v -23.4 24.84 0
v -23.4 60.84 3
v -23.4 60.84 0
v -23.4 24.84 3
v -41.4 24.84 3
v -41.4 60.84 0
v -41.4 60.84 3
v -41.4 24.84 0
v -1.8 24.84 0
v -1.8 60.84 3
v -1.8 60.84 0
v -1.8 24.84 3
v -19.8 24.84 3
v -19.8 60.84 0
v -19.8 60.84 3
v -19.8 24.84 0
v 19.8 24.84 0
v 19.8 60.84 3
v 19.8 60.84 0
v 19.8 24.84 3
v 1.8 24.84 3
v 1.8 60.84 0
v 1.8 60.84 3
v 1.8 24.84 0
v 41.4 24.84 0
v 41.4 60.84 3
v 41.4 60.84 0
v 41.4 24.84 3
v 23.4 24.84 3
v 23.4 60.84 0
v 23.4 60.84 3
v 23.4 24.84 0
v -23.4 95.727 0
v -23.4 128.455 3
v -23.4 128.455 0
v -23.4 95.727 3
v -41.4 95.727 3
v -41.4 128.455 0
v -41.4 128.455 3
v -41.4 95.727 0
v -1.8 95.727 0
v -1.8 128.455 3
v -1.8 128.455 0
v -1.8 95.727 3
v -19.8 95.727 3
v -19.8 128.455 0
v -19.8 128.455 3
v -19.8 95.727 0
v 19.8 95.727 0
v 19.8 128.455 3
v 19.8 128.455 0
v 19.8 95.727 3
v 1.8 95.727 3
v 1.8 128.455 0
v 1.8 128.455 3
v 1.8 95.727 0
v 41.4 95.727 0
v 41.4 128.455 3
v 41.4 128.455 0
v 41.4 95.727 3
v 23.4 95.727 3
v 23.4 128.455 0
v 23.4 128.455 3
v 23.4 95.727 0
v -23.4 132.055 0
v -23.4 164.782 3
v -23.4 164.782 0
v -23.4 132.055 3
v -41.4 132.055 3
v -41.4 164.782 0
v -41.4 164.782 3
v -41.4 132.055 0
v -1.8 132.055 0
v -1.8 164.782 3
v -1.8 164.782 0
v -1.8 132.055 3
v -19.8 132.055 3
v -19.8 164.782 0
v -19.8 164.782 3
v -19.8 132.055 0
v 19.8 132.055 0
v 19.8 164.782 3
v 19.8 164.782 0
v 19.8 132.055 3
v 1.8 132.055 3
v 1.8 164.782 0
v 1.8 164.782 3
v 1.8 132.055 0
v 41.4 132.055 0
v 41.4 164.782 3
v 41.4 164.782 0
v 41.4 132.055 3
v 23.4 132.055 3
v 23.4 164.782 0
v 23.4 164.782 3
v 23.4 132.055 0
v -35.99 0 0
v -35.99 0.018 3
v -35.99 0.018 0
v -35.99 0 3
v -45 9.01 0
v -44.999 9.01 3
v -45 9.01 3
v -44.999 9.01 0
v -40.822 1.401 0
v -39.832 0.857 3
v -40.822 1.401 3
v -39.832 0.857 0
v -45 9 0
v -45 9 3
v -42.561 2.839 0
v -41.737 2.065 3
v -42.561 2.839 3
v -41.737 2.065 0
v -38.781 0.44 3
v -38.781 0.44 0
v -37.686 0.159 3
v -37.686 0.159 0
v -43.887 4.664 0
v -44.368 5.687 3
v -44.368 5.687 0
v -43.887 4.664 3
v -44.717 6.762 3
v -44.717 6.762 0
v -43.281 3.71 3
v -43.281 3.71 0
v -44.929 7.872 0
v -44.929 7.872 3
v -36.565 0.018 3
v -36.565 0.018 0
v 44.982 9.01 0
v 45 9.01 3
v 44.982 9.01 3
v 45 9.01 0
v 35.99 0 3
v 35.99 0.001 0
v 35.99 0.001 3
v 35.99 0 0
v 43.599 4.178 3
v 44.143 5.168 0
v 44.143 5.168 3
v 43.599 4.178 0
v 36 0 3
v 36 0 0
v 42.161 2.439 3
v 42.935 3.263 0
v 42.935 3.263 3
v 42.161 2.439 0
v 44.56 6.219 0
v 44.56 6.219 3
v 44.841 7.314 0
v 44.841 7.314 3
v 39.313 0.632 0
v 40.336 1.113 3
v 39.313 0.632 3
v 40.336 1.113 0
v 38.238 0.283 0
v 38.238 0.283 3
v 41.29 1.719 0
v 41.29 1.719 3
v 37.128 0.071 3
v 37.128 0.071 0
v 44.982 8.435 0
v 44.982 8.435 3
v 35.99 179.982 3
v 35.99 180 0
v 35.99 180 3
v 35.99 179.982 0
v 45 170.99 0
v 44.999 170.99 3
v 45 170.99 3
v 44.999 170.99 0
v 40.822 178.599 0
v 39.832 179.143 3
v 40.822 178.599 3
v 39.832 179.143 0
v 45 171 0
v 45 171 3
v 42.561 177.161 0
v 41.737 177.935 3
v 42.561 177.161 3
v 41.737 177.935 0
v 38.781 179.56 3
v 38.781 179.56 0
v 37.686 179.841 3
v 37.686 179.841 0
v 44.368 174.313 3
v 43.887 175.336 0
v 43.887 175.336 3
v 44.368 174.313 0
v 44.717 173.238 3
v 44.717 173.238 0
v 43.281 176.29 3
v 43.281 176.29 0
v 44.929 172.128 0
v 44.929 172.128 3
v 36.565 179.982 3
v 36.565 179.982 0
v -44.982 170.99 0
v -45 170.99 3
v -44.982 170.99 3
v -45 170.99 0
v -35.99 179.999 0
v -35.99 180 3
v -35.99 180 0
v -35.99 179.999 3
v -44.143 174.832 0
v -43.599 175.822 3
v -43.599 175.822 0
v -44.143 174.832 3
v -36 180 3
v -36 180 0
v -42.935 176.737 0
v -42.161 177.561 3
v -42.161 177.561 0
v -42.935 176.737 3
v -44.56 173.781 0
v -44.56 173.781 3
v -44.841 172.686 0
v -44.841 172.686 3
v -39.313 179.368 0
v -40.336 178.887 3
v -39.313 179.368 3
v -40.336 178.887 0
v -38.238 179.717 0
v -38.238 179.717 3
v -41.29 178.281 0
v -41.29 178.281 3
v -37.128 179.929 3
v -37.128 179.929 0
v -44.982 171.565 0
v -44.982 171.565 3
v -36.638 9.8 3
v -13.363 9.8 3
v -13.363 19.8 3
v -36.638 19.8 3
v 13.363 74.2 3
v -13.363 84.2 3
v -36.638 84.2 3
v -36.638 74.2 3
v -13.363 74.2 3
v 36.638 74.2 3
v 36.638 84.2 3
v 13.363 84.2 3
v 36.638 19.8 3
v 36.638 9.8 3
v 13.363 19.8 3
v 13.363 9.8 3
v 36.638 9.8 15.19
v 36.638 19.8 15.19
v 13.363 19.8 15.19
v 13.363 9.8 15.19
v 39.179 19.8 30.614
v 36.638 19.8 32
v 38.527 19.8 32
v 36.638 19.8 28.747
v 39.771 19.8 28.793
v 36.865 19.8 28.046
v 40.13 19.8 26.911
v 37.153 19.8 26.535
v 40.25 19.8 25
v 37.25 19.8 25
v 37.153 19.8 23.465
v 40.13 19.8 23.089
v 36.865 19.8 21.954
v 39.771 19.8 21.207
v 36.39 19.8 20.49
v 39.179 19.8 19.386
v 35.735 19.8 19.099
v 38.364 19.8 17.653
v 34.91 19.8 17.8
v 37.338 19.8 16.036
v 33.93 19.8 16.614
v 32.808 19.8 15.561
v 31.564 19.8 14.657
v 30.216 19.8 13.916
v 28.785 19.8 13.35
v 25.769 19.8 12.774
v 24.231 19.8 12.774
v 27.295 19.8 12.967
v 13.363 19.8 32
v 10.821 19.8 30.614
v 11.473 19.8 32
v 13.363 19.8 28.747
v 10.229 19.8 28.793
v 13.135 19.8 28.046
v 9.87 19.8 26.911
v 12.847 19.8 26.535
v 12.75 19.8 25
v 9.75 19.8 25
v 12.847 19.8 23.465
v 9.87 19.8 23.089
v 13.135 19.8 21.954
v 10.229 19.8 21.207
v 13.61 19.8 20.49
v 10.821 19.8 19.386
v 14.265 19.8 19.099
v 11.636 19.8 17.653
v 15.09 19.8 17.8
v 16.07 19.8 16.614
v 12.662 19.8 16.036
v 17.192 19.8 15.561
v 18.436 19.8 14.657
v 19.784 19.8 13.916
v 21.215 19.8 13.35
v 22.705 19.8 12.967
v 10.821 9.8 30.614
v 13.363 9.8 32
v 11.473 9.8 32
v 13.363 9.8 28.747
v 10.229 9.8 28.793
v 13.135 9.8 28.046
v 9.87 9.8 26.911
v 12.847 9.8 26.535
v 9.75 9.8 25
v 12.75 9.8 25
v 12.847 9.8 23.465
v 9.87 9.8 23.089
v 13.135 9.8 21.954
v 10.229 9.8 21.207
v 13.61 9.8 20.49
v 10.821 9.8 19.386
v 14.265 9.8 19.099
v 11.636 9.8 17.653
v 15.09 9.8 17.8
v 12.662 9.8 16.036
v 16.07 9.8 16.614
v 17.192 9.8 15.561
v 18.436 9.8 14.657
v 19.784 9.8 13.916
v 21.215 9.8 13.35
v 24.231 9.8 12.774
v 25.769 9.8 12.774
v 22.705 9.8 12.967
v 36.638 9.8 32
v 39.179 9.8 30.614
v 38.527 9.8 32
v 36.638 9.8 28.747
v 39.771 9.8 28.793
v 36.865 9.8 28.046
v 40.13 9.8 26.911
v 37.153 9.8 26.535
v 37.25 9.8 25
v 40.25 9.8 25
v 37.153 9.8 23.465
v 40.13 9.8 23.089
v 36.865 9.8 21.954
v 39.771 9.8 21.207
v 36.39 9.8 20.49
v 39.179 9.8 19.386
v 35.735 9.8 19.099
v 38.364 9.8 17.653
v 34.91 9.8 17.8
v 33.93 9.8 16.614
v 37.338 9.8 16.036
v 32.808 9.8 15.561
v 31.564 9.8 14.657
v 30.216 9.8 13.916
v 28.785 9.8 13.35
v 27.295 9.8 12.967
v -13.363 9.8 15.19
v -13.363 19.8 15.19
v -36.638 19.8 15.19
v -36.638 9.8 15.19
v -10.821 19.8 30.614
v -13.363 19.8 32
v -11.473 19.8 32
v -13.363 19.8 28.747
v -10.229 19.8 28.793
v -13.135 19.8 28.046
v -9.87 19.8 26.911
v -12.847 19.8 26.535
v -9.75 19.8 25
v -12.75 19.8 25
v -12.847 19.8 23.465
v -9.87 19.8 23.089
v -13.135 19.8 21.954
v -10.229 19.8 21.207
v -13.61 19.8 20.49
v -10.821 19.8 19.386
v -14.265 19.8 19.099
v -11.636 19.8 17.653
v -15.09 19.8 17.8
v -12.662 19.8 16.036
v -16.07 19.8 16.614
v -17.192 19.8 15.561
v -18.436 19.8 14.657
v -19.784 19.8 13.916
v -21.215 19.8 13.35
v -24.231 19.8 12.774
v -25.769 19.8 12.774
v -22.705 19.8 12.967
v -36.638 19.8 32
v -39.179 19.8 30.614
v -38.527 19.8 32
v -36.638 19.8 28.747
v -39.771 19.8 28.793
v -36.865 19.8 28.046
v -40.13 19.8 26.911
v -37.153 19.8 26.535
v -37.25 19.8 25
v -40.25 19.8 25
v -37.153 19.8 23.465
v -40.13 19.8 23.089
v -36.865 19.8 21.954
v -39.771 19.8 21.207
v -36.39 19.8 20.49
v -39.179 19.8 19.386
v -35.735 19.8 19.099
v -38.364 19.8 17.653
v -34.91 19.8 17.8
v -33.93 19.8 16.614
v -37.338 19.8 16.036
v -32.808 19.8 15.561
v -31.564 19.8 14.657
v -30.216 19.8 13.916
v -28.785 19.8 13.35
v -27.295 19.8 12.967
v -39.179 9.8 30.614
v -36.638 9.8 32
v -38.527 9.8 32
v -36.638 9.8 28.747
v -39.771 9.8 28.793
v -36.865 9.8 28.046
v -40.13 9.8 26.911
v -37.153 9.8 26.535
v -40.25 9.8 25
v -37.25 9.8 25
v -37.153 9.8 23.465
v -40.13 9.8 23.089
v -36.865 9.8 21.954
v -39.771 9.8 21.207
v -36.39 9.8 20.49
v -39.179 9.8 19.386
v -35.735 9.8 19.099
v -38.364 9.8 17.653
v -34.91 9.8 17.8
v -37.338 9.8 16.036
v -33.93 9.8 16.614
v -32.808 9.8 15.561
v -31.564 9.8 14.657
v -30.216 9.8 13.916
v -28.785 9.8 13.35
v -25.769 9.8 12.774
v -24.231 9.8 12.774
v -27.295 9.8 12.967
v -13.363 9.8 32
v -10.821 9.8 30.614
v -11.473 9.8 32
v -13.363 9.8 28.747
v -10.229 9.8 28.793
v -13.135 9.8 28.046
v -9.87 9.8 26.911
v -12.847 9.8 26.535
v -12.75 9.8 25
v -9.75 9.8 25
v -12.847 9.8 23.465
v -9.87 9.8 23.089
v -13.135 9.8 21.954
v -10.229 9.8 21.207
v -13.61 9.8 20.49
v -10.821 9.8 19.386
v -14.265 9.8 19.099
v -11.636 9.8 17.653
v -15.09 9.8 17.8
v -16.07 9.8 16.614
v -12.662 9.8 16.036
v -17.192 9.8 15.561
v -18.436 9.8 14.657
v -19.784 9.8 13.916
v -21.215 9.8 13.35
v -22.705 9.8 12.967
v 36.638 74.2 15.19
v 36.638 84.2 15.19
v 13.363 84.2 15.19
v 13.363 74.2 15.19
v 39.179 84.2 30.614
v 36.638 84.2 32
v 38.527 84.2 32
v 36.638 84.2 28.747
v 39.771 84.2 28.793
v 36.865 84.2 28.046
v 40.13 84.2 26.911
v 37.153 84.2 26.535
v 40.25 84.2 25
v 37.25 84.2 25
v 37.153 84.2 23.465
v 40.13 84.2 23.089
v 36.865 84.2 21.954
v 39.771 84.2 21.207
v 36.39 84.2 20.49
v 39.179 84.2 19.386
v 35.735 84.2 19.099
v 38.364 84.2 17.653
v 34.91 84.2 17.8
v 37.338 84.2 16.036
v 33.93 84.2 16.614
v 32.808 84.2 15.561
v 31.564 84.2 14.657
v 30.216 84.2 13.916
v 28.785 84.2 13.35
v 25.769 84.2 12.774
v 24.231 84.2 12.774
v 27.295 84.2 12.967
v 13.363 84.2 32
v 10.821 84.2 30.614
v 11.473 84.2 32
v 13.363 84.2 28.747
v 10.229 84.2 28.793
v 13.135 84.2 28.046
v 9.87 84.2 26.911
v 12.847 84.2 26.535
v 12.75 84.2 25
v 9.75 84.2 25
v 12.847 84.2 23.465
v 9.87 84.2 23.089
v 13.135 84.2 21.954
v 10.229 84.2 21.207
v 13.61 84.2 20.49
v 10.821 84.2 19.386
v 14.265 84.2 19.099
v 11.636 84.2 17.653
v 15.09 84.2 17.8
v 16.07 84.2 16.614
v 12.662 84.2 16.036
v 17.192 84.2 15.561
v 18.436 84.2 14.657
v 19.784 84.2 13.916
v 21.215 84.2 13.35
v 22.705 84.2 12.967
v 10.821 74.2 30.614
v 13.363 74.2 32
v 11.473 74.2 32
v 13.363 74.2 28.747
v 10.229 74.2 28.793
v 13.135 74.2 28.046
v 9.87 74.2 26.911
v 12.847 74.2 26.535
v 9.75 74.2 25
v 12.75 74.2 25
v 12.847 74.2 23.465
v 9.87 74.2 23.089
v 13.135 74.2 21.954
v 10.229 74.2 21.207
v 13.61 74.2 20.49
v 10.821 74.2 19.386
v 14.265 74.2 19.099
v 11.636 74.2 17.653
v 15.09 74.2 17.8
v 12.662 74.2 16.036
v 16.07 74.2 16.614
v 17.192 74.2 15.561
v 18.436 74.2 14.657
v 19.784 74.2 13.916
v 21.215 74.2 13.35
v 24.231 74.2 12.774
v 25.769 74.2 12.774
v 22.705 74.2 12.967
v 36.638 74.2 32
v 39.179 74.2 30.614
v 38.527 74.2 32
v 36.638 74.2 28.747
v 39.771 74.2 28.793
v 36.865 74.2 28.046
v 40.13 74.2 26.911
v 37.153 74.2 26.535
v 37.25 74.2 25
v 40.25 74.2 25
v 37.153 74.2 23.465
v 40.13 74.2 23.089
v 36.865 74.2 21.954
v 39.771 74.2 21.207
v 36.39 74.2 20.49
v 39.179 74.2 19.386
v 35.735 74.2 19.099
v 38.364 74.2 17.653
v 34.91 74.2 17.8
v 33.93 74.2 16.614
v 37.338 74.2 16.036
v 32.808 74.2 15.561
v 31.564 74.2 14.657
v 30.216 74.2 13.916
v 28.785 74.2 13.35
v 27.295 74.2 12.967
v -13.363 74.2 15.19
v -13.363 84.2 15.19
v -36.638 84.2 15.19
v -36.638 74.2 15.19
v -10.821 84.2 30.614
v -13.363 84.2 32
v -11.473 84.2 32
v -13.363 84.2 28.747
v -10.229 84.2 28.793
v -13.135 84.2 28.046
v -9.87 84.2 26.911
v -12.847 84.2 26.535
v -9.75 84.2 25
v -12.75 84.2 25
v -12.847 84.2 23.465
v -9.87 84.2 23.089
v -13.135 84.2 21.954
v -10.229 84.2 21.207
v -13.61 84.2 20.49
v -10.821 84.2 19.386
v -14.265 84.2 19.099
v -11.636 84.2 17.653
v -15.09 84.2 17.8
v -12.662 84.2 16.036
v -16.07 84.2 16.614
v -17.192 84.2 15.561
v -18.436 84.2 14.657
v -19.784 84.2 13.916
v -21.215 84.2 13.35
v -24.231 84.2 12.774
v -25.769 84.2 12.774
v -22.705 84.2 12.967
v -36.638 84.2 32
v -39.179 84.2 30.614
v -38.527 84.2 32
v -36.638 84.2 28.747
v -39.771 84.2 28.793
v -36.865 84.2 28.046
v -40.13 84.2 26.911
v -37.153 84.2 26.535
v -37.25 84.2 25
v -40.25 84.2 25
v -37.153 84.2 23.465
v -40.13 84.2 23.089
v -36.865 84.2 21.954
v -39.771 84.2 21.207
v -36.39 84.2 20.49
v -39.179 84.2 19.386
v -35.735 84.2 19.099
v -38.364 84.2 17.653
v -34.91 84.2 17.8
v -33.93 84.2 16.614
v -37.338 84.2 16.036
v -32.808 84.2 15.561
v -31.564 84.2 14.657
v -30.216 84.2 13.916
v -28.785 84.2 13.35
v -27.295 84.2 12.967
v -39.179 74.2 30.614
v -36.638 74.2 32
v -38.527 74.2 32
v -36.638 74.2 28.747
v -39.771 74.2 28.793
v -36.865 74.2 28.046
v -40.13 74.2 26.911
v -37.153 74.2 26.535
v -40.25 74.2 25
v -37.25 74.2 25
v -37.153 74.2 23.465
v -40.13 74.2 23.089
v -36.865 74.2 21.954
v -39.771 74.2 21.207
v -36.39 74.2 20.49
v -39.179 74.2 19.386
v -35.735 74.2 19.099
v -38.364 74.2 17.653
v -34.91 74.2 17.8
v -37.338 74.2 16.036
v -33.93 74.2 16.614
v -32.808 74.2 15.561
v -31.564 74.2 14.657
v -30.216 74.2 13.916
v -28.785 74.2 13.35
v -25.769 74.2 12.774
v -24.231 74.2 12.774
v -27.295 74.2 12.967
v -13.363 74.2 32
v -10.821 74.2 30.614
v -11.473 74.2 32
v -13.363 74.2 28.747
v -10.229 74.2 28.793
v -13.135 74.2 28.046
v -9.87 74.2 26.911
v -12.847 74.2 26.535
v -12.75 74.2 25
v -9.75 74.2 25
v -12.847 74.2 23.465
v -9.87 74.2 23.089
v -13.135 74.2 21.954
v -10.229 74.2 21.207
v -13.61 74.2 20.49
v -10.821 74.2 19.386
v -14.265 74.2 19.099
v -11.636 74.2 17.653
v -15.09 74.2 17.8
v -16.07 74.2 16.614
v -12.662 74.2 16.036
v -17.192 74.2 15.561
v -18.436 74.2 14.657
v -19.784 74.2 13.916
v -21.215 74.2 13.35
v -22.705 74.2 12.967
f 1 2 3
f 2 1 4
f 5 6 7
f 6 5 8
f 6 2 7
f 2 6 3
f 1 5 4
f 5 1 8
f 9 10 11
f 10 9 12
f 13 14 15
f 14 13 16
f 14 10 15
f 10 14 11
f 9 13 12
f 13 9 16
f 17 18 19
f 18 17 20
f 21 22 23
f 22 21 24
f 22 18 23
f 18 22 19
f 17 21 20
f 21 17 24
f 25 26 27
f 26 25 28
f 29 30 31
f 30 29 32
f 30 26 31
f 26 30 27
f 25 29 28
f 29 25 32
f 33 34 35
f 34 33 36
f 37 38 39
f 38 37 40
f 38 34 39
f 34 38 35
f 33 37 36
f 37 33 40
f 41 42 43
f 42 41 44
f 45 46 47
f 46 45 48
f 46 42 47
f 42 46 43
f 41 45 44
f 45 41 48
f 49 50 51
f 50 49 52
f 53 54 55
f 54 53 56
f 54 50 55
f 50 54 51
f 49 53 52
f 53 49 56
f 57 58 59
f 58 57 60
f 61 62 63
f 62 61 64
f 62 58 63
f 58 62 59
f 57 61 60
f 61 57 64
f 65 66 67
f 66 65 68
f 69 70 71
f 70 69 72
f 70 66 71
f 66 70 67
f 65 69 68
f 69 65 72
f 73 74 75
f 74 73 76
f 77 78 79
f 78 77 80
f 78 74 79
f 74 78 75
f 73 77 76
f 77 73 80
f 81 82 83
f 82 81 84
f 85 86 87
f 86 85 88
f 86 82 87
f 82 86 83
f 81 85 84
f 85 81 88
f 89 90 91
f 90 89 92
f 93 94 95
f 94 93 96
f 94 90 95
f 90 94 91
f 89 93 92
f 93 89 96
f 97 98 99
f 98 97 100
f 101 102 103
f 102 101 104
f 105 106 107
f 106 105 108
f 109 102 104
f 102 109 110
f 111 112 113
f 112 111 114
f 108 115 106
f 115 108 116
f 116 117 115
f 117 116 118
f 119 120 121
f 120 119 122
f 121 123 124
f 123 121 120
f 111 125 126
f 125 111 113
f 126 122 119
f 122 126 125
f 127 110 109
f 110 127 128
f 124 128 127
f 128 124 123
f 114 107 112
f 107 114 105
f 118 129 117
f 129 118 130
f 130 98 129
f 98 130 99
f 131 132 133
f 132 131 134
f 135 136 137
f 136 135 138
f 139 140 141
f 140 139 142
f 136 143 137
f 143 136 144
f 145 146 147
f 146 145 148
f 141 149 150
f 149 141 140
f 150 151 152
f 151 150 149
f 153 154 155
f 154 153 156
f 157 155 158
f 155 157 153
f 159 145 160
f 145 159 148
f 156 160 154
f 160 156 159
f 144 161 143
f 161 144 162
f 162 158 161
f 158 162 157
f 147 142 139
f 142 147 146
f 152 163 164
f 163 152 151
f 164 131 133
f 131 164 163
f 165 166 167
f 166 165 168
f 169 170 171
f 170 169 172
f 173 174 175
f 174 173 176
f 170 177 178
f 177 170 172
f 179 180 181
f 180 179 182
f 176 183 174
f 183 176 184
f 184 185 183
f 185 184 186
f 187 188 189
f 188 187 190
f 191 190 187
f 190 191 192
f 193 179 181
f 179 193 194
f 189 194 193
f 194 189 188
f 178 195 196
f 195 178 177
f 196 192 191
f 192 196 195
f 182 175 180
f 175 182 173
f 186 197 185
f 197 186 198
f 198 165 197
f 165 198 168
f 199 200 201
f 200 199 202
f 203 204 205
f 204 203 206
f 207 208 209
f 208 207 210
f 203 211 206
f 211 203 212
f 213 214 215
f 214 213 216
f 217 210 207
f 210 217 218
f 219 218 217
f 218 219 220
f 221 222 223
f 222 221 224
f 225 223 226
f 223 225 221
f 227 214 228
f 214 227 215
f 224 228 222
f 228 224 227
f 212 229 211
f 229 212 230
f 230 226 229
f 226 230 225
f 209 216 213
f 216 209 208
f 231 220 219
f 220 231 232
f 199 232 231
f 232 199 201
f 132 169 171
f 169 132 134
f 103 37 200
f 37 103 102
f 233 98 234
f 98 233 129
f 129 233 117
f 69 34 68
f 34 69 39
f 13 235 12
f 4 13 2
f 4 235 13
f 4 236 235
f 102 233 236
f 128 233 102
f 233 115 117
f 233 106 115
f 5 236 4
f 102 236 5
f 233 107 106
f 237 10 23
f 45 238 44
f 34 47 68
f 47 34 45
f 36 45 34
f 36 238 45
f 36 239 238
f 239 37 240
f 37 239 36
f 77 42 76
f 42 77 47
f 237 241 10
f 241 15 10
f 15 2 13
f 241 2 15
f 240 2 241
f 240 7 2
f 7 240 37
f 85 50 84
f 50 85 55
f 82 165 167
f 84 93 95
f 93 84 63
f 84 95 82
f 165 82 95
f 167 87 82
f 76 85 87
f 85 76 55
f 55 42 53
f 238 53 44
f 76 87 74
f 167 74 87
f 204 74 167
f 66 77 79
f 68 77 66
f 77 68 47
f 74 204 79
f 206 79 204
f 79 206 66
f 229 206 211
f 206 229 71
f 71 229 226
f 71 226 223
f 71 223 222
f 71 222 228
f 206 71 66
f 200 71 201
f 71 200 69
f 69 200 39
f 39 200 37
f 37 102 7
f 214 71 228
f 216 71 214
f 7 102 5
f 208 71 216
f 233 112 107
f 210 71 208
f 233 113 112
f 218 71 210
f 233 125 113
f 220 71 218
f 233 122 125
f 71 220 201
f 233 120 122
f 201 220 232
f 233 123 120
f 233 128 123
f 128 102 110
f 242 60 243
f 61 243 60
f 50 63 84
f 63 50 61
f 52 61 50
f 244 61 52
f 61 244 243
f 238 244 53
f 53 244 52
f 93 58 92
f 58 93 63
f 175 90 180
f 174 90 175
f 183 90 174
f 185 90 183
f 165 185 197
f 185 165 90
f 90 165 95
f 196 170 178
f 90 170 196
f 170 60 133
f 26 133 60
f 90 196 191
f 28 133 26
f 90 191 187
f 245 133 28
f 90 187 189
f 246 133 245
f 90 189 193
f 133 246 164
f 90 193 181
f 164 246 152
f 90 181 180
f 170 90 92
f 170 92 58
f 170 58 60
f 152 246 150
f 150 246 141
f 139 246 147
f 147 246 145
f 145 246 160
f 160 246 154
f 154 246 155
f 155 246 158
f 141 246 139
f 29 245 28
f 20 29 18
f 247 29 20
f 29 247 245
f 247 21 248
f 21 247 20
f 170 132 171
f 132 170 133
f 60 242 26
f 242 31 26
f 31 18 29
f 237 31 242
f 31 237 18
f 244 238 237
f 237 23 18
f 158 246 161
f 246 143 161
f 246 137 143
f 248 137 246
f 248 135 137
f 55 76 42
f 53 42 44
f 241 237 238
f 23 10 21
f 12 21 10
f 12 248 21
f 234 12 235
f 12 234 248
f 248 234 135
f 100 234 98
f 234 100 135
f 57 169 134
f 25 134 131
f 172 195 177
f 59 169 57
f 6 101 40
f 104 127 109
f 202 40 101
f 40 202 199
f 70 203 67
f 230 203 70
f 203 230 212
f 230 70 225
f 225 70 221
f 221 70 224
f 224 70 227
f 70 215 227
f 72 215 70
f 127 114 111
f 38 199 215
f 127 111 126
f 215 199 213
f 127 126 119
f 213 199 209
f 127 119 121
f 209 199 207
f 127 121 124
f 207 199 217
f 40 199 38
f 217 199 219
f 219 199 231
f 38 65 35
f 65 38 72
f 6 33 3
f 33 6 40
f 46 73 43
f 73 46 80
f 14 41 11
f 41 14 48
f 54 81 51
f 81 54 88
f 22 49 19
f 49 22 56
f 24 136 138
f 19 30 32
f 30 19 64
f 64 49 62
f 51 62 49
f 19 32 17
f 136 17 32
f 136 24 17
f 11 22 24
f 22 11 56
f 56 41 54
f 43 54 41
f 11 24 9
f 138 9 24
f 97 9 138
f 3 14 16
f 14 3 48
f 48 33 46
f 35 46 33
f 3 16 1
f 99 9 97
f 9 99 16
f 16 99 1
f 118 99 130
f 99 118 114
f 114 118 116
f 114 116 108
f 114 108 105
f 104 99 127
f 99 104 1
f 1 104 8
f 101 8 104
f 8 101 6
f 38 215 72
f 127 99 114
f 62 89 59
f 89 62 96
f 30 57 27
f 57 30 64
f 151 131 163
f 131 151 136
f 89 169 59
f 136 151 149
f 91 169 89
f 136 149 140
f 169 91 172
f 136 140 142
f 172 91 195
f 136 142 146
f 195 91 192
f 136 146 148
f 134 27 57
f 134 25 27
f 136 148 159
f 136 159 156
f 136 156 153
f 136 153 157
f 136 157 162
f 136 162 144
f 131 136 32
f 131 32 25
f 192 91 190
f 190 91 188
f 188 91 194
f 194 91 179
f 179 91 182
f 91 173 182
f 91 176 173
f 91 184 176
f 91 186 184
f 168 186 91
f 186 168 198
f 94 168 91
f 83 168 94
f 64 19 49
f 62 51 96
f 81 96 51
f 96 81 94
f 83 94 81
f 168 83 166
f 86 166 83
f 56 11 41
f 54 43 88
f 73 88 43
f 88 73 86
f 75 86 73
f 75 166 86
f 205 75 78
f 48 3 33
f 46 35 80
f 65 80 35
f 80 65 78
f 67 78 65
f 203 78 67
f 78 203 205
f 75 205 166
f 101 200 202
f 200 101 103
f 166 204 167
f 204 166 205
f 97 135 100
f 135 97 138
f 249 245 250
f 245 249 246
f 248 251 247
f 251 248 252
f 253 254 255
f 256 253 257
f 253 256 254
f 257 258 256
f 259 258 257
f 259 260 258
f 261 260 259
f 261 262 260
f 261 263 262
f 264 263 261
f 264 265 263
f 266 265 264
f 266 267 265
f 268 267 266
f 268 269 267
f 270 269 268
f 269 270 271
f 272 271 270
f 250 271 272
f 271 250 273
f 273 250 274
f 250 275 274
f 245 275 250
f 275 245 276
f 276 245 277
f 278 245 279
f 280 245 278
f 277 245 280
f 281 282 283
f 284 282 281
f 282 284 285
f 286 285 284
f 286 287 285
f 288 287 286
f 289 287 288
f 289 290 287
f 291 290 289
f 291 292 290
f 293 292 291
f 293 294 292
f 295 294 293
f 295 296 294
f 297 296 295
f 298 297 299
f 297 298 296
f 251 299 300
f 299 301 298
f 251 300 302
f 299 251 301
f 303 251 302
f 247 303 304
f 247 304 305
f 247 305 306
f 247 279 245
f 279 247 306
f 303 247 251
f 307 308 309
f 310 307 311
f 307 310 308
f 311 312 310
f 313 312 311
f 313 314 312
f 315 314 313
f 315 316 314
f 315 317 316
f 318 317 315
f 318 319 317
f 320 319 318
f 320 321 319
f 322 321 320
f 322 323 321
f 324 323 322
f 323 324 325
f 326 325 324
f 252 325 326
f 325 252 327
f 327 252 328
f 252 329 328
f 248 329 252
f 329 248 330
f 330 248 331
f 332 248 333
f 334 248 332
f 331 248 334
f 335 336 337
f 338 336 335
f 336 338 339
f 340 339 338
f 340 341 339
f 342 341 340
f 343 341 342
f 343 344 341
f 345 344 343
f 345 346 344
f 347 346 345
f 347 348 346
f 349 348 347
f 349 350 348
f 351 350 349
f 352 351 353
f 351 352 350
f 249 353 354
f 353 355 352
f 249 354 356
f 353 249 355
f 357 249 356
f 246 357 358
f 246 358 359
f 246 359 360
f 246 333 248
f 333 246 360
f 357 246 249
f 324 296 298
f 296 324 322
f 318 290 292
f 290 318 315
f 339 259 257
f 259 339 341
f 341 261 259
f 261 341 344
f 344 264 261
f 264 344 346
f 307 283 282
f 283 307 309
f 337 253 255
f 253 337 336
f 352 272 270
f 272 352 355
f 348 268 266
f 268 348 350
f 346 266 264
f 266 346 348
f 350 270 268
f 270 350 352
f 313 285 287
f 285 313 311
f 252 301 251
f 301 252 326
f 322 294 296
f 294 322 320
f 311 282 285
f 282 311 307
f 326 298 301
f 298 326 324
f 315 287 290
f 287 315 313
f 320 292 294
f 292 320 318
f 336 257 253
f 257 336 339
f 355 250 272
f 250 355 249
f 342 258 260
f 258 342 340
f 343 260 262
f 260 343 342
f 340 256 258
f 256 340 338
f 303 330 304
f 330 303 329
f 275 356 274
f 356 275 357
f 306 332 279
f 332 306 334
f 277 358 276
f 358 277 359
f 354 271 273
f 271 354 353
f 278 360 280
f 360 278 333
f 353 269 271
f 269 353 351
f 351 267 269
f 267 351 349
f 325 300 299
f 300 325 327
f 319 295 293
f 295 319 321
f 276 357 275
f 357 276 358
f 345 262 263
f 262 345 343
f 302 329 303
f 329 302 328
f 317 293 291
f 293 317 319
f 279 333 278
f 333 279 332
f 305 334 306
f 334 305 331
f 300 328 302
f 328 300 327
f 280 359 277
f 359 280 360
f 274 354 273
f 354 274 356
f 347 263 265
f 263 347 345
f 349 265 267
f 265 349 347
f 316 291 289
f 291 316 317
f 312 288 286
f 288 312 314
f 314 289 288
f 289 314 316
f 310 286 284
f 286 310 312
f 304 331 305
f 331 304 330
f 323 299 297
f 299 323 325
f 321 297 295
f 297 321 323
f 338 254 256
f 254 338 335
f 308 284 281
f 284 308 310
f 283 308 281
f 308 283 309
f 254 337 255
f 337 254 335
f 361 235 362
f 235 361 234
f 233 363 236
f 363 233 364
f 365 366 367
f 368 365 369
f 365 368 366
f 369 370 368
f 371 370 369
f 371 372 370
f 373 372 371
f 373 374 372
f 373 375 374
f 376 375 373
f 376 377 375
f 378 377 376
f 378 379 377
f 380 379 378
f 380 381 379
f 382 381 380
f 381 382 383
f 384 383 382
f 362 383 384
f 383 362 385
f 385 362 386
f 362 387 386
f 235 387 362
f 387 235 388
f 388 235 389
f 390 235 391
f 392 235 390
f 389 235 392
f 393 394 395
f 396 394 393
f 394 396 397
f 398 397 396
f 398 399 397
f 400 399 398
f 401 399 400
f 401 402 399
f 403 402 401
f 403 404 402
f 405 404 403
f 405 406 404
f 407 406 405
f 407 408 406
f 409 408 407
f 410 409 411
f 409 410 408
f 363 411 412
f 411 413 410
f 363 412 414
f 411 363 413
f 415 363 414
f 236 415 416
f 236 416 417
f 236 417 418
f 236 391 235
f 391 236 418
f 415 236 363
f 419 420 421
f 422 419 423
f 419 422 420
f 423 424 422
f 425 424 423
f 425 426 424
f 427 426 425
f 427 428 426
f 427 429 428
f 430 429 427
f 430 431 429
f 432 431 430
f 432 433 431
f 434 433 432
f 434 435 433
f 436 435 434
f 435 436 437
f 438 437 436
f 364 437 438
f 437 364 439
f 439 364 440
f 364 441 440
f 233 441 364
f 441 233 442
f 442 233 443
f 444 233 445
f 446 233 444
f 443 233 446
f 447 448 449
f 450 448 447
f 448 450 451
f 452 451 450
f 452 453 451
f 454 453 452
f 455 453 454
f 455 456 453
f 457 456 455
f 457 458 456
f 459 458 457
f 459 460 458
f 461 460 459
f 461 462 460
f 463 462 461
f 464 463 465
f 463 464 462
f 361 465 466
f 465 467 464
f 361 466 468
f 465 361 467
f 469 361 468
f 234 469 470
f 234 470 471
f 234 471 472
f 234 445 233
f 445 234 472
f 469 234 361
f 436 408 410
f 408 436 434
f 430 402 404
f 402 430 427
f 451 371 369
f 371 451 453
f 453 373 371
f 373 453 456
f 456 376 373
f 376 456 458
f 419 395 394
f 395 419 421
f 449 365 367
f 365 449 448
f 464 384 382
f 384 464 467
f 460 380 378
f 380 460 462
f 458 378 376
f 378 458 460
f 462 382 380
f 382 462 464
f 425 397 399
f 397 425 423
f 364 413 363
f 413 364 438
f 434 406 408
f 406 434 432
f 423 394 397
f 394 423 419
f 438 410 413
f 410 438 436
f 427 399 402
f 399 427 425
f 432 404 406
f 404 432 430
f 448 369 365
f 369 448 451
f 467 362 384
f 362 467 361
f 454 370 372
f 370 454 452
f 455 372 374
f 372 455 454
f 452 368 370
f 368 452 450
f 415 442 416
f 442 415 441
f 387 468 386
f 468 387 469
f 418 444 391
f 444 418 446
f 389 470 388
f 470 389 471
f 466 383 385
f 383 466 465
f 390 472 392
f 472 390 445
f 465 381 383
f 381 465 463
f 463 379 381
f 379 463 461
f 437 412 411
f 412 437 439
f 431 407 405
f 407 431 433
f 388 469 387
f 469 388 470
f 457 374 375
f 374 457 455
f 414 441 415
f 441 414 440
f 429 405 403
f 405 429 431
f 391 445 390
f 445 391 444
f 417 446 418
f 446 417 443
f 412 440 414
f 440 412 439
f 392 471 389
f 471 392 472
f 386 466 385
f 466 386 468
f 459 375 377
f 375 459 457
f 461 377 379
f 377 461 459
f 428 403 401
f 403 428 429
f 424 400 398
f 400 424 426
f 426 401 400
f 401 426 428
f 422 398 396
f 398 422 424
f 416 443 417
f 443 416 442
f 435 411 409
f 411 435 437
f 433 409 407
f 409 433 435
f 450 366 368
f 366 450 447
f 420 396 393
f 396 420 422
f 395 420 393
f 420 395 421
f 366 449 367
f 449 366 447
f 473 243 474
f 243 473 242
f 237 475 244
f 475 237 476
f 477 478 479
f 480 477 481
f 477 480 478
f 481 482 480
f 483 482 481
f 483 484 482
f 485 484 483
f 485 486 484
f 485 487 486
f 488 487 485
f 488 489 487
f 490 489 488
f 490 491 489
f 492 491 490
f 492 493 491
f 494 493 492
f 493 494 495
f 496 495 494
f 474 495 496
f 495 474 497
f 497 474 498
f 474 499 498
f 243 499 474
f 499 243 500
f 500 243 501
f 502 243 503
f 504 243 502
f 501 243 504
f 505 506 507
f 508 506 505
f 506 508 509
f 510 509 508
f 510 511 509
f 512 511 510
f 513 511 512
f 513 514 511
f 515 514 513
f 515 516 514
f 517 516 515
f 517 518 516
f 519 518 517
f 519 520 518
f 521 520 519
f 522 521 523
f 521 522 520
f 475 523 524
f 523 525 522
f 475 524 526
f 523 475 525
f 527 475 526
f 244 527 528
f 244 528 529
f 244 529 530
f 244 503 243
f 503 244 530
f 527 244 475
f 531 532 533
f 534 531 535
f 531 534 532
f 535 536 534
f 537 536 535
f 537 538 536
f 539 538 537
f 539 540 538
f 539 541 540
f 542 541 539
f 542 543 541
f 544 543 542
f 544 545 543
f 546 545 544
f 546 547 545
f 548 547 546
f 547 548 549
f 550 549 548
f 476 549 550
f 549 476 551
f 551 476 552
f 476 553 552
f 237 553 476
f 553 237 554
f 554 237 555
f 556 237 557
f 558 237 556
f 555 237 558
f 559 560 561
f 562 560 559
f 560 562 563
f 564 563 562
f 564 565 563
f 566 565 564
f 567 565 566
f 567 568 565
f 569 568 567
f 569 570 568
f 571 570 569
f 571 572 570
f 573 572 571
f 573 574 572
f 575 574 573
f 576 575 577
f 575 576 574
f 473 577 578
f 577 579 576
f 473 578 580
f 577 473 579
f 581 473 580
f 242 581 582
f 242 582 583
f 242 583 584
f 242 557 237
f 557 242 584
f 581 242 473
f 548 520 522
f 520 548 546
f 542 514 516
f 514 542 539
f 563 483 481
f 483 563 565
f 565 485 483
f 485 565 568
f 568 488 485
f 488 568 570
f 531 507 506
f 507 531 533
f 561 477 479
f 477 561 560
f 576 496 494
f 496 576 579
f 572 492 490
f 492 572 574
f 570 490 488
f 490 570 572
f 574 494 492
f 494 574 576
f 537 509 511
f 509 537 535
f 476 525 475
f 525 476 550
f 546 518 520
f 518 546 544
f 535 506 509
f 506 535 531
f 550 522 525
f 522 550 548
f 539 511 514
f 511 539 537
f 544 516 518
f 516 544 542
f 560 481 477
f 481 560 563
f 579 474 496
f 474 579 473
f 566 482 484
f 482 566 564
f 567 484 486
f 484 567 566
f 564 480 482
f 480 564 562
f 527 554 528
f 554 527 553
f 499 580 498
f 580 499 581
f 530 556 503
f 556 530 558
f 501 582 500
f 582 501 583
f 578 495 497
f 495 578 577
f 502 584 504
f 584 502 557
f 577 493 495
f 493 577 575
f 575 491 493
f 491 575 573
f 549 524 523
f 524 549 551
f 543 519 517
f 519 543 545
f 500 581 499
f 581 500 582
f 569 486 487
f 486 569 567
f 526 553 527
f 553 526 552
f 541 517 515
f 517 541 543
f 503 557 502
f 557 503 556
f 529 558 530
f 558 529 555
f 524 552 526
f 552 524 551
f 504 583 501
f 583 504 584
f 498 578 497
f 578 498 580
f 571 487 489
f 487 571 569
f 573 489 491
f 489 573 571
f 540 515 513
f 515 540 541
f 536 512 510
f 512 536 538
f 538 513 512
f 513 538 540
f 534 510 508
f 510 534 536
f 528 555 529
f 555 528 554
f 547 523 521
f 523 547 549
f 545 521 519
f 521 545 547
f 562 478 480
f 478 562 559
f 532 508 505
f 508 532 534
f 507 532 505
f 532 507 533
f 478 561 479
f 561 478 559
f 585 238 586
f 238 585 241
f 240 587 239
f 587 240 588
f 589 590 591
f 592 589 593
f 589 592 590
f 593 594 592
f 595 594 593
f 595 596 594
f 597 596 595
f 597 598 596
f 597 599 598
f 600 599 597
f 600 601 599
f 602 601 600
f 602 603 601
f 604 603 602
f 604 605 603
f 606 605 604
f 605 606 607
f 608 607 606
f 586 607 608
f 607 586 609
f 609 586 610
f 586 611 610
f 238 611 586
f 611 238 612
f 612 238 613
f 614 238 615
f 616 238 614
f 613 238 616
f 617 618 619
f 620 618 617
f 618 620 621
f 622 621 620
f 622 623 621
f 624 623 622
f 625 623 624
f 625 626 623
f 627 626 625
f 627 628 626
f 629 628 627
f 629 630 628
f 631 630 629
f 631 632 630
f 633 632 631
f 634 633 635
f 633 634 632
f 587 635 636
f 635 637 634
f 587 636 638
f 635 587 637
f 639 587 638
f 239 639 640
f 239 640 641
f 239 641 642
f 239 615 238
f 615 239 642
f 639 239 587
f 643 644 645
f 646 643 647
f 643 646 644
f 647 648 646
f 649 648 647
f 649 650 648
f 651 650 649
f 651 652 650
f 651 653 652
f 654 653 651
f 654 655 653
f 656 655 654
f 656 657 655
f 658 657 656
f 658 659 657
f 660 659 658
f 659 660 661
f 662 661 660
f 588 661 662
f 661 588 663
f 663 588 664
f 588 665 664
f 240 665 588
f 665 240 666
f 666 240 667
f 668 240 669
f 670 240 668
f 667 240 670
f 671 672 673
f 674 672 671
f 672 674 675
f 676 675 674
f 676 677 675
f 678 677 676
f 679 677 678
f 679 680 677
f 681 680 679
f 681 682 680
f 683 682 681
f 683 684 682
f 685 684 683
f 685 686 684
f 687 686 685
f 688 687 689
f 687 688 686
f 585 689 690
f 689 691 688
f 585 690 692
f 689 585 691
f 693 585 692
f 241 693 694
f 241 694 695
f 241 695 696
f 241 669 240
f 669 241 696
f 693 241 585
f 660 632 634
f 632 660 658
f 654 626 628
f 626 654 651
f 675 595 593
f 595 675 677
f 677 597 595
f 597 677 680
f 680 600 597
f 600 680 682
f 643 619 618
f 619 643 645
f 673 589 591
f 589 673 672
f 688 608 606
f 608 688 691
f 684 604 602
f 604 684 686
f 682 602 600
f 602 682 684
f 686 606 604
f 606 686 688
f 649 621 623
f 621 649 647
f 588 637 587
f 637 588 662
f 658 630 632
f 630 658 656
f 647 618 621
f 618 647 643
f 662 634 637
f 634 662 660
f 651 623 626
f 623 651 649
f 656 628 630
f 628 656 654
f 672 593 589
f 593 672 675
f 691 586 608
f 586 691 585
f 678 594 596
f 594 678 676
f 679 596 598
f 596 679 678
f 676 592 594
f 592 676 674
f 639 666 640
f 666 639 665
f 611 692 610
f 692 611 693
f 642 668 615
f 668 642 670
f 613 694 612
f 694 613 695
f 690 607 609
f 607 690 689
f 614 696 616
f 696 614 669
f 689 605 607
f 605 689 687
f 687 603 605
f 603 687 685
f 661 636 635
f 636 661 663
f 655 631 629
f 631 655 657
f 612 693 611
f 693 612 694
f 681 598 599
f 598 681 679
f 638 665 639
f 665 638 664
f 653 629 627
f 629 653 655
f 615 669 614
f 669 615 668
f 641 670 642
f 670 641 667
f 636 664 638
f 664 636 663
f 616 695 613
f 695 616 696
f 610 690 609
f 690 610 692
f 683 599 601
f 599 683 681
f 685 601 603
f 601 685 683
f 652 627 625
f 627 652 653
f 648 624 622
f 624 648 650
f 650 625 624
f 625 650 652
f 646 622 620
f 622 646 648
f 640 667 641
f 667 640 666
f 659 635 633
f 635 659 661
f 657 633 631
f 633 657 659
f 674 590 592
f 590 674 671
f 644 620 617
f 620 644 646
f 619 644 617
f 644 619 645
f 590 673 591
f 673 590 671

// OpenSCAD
/* [Global] */

// the width of the base
baseWidth = 90; // [80:100]
// the length of the base
baseLen = 180; // [100:200]
// the thickness of the base
baseThickness = 3; // [1:3]

// the diameter of your heater
heaterDiam = 24.5; // 
// the height of the center of the heater
postHeight = 25; // [19:30]
// the distance between the center of the heaters
postSpacing = 50; // [30:60]

/* [Hidden] */

postWidth = heaterDiam*.95; // 25;
postLen = 10;

ringThickness = 3;

echo("baseLen", baseLen);

module print_post_ring()
{
	translate([postWidth/2, postLen+0.00, postHeight]) {
		rotate([90, 0, 0]) {
			difference() {
				cylinder(h=postLen+.0, r=(heaterDiam/2+ringThickness), $fn=50);
				translate([0, 0, -0.1]) {
					cylinder(h=postLen+.2, r=heaterDiam/2, $fn=50);
				}
			}
		}
	}
}

module print_post_base()
{
	difference()
	{
       	cube([postWidth, postLen, postHeight]);
		translate([postWidth/2, postLen+0.02, postHeight]) {
			rotate([90, 0, 0]) {
				cylinder(h=postLen+.1, r=heaterDiam/2, $fn=50);
			}
		}
	}
}

module print_post()
{
	center = postWidth/2;
	gapWidth = heaterDiam * .95;

	chopper = heaterDiam+(ringThickness*2);

	translate([-postWidth/2, -postLen/2, 0]) {
		difference() {
//		union() {
			union()
			{
				print_post_base();
				print_post_ring();
			}
			union() {
				translate([0, -.1, postHeight]) {
					color("green") {
						translate([center-(gapWidth/2), 0, 0])
							cube([gapWidth, 10+.2, 20]);
					}
				}
				translate([(center-(chopper/2)), -.1, postHeight+7]) {
					color("red");
					cube([chopper, 10+.2, 20]);
				}
			}
		}
	}
}

module fillet(r, h) {
    translate([r / 2, r / 2, 0])

        difference() {
            cube([r + 0.02, r + 0.02, h], center = true);

            translate([r/2, r/2, 0])
                cylinder(r = r, h = h + 1, center = true, $fn=50);

        }
}

module print_base()
{

	HoleCount = 4;
	holeWidth = baseWidth/(HoleCount+1);
	extraSpace = baseWidth - (holeWidth*HoleCount);
	spacing = extraSpace/5; // baseWidth / (HoleCount);
	echo("baseWidth ", baseWidth);
	echo("holeWidth ", holeWidth);
	echo("extraSpace ", extraSpace);
	echo("spacing ", spacing);
	translate([-baseWidth/2, 0, 0])
	{
		difference() {
			cube([baseWidth, baseLen, baseThickness]);
			for (holeNum = [1:HoleCount]) {
				translate([((holeNum-1)*(holeWidth+spacing))+spacing/1, 
						baseLen*.138, -.1]) {
		        		cube([baseWidth/5, baseLen/5, baseThickness+.2]);
				}
			}
			for (yHole = [2:3]) {
				for (holeNum = [1:HoleCount]) {
					translate([((holeNum-1)*(holeWidth+spacing))+spacing/1, 
							((yHole-1)*((baseLen/5.5)+spacing))+(baseLen*.33), -.1]) {
			        		cube([baseWidth/5, baseLen/5.5, baseThickness+.2]);
					}
				}
			}
			fillet(baseLen*.05, baseThickness*3);
			translate([baseWidth, 0, 0])
				rotate([0, 0, 90])
					fillet(baseLen*.05, baseThickness*3);
			translate([baseWidth, baseLen, 0])
				rotate([0, 0, 180])
					fillet(baseLen*.05, baseThickness*3);
			translate([0, baseLen, 0])
				rotate([0, 0, 270])
					fillet(baseLen*.05, baseThickness*3);
		}
	}
}

module print_test_base()
{
	test_base_size = 30;
	translate([-test_base_size/2, -test_base_size/2, 0])
	{
        cube([test_base_size, test_base_size, baseThickness]);
	}
}

module print_all()
{
	union() {
		print_base();
		translate([postSpacing/2, (baseLen*.11)-(postLen/2), 0])
			print_post();
		translate([-postSpacing/2, (baseLen*.11)-(postLen/2), 0])
			print_post();
		translate([postSpacing/2, baseLen*.44, 0])
			print_post();
		translate([-postSpacing/2, baseLen*.44, 0])
			print_post();
	}
}

module print_postTest()
{
	union() {
		print_test_base();
		print_post();
	}
}


test = 0;

if (test == 0) {
	print_all();
} else {
	print_postTest();
}
